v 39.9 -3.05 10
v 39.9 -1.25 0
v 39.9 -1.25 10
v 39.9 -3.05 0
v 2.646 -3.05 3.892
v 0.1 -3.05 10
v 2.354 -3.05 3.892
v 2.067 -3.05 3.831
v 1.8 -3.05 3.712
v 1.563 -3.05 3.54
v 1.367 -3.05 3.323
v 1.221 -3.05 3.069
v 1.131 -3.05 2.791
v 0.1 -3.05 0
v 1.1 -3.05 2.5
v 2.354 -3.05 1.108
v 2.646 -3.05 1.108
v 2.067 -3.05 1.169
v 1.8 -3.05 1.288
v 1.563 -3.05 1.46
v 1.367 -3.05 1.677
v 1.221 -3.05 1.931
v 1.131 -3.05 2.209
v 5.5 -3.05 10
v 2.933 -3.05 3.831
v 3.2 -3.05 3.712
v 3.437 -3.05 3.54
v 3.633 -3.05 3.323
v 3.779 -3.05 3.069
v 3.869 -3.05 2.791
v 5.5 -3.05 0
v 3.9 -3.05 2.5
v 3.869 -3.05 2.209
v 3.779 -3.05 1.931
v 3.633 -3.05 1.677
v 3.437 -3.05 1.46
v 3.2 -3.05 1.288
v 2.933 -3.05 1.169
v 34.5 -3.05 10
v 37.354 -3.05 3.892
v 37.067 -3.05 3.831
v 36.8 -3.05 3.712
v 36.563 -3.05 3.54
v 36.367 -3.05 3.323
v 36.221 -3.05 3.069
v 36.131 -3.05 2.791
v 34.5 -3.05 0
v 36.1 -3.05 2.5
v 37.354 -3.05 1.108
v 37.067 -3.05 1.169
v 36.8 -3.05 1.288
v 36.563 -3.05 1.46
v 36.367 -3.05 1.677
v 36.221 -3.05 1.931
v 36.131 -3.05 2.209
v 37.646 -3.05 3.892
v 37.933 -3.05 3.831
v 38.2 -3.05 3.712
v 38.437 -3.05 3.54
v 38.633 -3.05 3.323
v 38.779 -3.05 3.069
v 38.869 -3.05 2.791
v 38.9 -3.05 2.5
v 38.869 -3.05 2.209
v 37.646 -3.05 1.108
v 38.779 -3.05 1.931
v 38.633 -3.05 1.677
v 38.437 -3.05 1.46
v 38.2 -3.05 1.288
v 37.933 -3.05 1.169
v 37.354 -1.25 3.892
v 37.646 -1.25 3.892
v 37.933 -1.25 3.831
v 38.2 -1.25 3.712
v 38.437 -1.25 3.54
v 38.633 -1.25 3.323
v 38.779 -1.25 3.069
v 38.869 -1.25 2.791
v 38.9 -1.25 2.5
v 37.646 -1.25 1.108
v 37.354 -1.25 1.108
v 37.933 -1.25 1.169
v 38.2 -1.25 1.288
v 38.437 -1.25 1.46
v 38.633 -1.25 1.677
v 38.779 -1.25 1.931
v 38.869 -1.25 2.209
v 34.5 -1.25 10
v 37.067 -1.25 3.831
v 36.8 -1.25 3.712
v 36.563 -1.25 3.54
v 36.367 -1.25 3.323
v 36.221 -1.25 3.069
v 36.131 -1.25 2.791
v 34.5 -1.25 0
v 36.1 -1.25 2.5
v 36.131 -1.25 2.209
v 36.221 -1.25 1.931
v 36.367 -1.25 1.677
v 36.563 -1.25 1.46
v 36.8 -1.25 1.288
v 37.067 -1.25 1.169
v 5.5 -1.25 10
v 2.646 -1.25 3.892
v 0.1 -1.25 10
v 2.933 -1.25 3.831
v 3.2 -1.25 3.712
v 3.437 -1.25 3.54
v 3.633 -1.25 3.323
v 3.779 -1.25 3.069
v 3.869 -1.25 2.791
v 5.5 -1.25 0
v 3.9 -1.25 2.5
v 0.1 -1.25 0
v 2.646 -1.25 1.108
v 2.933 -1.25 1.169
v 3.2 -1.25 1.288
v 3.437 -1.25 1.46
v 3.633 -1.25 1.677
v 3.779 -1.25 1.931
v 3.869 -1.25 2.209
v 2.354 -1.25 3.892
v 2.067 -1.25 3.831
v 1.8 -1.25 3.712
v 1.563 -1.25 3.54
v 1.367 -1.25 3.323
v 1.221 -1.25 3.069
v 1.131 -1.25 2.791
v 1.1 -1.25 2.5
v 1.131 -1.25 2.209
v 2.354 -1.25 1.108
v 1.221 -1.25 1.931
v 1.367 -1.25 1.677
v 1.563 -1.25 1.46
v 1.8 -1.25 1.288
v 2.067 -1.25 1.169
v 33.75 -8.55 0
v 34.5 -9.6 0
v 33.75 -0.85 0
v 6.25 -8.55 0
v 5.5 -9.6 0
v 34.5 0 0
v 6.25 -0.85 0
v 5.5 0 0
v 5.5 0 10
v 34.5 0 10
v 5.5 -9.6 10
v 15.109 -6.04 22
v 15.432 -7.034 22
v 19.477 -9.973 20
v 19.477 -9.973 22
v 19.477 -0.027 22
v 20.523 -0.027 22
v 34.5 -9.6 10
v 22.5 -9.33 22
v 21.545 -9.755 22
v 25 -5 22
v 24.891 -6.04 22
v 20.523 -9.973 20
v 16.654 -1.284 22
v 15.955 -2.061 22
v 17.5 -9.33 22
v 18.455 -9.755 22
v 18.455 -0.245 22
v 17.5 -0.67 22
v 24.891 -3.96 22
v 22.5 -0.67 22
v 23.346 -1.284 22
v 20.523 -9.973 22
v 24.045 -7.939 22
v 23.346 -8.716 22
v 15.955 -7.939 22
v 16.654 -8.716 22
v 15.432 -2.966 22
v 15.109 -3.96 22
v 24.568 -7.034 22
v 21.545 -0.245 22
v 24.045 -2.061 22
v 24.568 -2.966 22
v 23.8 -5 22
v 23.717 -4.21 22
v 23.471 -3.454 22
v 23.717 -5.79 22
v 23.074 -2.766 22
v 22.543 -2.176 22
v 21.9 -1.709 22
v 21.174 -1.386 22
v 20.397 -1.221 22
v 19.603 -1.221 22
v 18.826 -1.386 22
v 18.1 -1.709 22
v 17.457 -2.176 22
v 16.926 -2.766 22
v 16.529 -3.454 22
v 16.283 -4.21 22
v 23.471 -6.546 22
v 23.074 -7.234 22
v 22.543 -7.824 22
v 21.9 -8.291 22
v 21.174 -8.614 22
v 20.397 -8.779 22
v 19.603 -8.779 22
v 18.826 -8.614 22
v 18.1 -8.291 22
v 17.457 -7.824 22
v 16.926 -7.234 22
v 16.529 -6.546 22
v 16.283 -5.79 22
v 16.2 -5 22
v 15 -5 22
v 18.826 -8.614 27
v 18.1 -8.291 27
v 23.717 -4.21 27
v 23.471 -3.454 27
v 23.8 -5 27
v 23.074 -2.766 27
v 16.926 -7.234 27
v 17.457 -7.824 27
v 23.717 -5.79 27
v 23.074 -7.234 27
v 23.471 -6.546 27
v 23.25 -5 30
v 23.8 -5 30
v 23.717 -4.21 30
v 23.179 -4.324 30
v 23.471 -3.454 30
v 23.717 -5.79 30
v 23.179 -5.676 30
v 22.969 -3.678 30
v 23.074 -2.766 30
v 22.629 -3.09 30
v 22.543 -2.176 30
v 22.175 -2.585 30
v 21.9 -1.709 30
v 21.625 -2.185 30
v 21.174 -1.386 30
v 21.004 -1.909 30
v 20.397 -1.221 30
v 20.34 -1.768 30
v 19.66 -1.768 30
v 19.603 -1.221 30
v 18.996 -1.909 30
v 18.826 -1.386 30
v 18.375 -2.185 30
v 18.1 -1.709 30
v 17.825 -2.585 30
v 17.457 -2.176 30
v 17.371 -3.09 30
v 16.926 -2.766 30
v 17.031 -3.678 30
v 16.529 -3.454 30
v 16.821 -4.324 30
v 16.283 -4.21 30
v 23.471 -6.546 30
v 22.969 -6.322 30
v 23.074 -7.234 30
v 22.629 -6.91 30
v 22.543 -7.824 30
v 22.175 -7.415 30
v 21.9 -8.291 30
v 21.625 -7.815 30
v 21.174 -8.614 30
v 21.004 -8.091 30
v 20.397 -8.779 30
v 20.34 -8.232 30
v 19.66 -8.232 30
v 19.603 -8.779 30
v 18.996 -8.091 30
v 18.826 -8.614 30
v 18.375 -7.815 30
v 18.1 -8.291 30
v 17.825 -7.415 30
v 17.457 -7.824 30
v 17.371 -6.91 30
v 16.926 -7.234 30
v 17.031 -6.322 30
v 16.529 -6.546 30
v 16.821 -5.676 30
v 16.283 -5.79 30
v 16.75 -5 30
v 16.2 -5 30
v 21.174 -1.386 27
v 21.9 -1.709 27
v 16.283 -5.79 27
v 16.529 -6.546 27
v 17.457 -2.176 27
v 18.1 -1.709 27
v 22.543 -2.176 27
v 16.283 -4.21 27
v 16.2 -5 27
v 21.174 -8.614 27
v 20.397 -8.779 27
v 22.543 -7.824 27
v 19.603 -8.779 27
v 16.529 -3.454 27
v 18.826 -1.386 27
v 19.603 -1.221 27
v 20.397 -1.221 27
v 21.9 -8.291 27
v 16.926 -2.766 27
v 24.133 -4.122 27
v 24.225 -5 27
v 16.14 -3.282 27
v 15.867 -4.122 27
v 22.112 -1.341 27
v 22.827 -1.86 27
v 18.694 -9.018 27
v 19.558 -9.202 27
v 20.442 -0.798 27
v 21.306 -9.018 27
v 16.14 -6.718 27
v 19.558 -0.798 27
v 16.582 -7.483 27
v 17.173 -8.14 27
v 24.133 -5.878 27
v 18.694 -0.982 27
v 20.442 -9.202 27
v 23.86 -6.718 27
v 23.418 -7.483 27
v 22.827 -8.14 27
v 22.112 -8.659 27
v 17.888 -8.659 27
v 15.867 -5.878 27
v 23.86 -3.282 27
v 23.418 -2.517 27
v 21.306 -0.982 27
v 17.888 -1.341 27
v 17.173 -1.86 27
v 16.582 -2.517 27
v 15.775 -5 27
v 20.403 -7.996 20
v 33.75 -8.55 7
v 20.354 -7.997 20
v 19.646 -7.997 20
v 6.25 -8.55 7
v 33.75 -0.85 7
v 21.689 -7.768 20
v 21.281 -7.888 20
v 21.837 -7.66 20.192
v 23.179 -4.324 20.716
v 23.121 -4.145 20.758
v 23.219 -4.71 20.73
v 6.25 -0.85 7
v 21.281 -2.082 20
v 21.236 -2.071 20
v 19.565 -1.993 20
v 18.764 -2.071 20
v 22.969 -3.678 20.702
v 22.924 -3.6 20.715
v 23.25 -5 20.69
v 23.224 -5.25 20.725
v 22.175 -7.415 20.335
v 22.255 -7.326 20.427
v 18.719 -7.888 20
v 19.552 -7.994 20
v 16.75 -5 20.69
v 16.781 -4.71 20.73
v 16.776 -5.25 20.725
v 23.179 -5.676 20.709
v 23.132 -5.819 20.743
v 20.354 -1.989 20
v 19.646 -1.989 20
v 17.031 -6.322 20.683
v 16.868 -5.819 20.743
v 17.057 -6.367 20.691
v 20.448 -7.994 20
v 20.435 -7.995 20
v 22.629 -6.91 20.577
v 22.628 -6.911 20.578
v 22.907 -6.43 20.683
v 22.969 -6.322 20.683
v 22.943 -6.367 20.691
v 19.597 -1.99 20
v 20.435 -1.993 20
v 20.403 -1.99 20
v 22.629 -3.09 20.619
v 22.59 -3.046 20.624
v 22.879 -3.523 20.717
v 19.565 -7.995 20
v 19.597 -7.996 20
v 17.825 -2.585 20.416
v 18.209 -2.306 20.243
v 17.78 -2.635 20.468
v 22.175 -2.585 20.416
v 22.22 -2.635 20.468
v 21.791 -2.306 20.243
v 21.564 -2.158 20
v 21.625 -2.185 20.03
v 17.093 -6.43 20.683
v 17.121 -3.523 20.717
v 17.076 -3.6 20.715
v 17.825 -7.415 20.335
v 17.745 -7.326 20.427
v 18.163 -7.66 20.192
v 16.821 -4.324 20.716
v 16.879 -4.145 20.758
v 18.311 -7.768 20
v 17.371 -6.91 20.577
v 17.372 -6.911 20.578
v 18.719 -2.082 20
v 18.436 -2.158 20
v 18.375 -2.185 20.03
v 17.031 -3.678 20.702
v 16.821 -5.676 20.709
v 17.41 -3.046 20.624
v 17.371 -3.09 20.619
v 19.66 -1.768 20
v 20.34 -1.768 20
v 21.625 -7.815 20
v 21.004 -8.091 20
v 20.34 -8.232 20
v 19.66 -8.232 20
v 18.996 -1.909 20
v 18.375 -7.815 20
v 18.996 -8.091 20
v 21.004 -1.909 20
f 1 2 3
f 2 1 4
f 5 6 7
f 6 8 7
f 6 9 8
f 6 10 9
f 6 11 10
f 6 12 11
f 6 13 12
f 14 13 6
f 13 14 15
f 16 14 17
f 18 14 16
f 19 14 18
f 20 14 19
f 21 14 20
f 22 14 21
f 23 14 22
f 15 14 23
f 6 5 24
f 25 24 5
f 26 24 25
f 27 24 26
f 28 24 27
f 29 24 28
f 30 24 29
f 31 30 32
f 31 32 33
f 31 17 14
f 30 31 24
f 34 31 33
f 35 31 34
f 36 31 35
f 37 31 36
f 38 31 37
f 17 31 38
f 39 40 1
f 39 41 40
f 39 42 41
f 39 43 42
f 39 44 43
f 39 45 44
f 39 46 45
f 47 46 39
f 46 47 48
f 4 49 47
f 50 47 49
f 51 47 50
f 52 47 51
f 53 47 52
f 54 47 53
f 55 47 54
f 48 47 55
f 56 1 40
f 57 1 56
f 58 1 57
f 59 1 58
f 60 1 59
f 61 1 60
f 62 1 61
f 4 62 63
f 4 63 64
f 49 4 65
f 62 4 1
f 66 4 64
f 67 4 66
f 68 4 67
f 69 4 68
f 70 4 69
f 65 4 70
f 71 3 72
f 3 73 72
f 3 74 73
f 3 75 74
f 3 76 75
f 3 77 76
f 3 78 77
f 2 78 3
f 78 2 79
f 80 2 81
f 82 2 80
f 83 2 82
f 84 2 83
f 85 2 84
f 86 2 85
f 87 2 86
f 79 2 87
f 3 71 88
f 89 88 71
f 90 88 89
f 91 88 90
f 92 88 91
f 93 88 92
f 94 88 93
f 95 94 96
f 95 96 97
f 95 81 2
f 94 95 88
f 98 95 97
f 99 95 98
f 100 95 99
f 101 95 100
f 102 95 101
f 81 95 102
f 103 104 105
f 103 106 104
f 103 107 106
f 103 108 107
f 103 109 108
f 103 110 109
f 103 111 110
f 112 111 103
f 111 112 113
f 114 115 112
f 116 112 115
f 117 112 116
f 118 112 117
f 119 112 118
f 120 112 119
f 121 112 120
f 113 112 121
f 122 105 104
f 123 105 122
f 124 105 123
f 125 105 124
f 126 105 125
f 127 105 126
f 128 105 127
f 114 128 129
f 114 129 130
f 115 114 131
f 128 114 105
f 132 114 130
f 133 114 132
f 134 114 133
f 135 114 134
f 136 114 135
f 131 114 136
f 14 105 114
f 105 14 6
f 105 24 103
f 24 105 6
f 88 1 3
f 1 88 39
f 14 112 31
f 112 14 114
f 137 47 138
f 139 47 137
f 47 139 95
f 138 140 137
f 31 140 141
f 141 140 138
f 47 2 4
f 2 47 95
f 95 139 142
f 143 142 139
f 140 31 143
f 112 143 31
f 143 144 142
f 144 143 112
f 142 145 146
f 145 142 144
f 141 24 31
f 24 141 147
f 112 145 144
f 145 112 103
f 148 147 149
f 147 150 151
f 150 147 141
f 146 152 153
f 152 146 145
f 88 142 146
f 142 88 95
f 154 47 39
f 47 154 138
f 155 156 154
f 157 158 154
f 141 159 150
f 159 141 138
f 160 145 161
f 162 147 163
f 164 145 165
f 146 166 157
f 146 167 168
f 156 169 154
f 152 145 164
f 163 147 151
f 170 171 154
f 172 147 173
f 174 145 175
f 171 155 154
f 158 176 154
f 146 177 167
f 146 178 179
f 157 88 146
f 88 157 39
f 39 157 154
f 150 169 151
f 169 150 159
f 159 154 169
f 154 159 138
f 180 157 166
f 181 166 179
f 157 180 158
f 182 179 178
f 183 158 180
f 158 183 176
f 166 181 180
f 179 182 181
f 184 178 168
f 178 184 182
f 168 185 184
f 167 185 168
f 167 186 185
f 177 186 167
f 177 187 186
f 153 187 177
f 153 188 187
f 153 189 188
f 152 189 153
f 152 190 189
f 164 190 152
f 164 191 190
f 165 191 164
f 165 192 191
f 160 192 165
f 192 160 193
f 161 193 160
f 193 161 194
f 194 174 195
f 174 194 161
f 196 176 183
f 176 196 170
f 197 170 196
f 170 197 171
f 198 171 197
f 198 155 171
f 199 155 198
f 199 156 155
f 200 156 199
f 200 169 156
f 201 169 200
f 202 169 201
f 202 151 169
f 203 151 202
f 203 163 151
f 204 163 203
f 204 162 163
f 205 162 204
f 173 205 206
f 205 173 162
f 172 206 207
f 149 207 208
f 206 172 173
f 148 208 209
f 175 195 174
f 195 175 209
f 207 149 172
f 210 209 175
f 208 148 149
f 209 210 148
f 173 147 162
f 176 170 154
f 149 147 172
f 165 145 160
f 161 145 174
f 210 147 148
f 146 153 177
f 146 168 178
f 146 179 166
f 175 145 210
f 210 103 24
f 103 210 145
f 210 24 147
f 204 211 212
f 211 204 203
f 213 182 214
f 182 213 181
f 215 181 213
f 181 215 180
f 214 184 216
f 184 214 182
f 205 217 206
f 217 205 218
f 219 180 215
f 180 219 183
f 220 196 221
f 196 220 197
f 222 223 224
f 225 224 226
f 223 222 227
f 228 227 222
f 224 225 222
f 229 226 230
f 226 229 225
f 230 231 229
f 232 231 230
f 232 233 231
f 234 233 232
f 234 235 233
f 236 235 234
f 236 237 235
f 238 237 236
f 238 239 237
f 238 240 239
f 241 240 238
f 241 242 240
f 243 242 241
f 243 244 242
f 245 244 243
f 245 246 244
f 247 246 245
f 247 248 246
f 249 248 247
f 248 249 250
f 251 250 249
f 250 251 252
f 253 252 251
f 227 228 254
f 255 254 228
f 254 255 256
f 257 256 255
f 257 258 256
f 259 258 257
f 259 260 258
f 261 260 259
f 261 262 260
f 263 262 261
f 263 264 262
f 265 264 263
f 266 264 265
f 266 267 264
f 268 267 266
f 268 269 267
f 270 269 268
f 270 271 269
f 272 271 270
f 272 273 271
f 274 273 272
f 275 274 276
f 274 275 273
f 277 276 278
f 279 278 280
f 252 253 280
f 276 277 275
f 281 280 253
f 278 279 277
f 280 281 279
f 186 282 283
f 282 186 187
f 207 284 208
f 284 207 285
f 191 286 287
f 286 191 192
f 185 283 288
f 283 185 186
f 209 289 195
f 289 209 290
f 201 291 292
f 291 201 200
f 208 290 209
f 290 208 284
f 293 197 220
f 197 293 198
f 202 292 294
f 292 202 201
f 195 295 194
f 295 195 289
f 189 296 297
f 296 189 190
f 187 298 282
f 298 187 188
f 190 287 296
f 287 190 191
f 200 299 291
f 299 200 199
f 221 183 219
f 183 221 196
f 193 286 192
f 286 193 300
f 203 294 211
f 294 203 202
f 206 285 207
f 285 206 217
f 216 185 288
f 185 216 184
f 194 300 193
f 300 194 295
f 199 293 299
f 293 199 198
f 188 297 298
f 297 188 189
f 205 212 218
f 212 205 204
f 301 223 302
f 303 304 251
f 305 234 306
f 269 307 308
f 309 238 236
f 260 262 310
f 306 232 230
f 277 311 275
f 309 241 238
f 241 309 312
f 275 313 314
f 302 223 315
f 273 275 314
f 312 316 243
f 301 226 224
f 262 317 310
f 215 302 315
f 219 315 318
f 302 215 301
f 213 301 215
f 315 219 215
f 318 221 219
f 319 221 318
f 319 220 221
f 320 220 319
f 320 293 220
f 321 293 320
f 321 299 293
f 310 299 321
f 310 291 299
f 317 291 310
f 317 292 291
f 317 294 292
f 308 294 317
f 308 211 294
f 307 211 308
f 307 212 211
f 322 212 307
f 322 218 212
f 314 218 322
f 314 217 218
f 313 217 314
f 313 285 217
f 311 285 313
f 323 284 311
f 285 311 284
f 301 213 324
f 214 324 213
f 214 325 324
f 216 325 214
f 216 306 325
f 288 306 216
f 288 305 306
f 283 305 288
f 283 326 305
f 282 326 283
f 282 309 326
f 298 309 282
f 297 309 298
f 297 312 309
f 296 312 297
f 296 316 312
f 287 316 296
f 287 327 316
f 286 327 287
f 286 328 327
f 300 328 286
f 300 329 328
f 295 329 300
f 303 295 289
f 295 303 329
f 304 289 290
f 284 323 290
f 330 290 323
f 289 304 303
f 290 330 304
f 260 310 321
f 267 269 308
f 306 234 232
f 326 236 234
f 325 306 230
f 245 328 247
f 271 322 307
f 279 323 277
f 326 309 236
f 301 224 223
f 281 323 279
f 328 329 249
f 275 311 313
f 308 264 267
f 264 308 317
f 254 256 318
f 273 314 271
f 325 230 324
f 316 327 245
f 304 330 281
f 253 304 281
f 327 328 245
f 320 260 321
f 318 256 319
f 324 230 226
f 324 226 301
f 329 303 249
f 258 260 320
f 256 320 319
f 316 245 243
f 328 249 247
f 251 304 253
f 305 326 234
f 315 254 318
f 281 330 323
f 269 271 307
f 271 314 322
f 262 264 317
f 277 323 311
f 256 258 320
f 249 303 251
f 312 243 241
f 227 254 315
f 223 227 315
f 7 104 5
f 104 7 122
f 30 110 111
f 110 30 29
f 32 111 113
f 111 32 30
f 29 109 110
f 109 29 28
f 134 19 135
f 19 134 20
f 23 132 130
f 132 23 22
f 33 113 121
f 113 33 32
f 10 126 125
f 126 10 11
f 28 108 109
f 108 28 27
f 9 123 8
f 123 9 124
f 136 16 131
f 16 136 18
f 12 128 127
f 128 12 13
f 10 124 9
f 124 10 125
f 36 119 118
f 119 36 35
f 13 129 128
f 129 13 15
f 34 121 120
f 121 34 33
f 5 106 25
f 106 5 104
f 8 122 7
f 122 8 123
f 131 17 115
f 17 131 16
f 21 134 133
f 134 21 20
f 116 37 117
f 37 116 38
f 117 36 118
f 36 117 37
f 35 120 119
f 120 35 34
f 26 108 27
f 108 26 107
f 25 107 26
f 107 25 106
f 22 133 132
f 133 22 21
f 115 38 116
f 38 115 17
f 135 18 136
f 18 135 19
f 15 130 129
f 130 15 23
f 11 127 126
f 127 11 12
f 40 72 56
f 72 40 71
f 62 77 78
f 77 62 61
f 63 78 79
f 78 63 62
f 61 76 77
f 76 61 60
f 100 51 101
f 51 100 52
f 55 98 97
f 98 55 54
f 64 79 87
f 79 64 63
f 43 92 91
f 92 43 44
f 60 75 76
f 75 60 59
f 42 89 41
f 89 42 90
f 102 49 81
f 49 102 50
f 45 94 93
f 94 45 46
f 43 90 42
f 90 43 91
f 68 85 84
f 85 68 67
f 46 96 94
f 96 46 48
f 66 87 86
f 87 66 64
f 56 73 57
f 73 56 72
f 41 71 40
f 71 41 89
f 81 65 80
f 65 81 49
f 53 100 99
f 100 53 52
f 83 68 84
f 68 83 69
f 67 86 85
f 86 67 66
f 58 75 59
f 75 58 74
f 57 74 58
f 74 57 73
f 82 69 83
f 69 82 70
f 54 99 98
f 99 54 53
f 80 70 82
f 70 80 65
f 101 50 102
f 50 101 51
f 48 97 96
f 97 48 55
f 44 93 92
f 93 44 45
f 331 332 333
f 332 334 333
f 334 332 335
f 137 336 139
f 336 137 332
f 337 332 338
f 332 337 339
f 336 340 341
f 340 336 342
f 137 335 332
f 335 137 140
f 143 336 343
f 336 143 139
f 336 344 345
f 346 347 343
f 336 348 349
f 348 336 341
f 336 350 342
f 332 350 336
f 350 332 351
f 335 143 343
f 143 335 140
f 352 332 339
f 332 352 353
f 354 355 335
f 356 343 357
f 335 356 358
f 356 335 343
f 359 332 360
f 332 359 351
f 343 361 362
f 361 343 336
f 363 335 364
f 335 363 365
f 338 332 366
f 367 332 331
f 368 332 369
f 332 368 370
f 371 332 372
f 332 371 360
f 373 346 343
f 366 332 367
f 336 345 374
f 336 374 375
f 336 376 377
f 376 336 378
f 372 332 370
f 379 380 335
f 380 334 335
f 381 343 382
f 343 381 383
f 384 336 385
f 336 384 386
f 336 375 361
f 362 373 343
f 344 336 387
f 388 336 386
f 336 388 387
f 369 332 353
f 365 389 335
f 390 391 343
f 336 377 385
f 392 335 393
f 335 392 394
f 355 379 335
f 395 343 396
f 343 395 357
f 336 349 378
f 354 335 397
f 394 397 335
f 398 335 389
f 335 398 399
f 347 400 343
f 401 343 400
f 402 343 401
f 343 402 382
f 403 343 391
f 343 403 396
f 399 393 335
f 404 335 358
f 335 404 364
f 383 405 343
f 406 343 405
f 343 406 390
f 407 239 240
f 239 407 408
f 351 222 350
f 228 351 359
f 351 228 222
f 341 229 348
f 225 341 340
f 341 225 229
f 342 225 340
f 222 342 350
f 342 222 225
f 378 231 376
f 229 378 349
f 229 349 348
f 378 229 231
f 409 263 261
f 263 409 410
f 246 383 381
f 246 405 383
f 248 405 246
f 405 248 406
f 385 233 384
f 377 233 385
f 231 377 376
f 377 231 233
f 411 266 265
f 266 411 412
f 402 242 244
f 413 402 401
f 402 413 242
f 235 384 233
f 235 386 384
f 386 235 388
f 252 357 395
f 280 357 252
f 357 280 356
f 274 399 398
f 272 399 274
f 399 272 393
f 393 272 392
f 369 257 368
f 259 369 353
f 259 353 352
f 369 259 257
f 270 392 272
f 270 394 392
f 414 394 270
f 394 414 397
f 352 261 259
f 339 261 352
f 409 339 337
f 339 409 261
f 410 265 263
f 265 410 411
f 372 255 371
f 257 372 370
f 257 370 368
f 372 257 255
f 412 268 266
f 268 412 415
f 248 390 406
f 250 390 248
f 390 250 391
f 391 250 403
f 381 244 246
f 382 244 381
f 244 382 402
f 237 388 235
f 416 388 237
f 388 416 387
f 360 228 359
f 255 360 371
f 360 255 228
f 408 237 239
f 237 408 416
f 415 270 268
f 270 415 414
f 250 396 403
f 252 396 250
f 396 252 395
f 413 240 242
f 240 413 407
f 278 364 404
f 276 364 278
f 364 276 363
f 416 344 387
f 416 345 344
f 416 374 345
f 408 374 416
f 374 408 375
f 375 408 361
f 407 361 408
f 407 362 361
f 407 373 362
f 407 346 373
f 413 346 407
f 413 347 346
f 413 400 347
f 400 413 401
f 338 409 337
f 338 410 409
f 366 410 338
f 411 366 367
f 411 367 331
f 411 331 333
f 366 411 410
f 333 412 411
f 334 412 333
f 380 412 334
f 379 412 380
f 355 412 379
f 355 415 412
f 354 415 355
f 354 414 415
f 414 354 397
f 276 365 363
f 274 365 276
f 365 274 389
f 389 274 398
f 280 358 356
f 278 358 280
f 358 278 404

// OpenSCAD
$fn=30;
r1=7.6/2;
r2=8.45/2;
h2=20;
rinner=6.5/2;
rotate([90,0,0])
difference() { 
    union() {
    translate([0.1,0,1.25]) cube([39.8,10,1.8]);
    hull() {
    translate([5.5,0,0]) cube([29,10,9.6]);
        translate([20,h2,5]) rotate([-90,0,0]) cylinder(r=5,h=2);

//    translate([20,30,5]) sphere(r=5);
    };
        translate([20,h2-5,5]) rotate([-90,0,0]) cylinder(r=r1,h=15);
        translate([20,h2+7,5]) rotate([-90,0,0]) cylinder(r1=r2,r2=r1,h=3);
        };
    translate([2.5,2.5,-.1]) cylinder(r=1.4,h=10);
    translate([40-2.5,2.5,-.1]) cylinder(r=1.4,h=10);
    hull () {
        translate([6.25,-1,0.85]) cube([27.5,8,7.7]);
        translate([20,h2,5]) sphere(r=3);
    };
        translate([20,20,5]) rotate([-90,0,0]) cylinder(r=rinner,h=35);
};
